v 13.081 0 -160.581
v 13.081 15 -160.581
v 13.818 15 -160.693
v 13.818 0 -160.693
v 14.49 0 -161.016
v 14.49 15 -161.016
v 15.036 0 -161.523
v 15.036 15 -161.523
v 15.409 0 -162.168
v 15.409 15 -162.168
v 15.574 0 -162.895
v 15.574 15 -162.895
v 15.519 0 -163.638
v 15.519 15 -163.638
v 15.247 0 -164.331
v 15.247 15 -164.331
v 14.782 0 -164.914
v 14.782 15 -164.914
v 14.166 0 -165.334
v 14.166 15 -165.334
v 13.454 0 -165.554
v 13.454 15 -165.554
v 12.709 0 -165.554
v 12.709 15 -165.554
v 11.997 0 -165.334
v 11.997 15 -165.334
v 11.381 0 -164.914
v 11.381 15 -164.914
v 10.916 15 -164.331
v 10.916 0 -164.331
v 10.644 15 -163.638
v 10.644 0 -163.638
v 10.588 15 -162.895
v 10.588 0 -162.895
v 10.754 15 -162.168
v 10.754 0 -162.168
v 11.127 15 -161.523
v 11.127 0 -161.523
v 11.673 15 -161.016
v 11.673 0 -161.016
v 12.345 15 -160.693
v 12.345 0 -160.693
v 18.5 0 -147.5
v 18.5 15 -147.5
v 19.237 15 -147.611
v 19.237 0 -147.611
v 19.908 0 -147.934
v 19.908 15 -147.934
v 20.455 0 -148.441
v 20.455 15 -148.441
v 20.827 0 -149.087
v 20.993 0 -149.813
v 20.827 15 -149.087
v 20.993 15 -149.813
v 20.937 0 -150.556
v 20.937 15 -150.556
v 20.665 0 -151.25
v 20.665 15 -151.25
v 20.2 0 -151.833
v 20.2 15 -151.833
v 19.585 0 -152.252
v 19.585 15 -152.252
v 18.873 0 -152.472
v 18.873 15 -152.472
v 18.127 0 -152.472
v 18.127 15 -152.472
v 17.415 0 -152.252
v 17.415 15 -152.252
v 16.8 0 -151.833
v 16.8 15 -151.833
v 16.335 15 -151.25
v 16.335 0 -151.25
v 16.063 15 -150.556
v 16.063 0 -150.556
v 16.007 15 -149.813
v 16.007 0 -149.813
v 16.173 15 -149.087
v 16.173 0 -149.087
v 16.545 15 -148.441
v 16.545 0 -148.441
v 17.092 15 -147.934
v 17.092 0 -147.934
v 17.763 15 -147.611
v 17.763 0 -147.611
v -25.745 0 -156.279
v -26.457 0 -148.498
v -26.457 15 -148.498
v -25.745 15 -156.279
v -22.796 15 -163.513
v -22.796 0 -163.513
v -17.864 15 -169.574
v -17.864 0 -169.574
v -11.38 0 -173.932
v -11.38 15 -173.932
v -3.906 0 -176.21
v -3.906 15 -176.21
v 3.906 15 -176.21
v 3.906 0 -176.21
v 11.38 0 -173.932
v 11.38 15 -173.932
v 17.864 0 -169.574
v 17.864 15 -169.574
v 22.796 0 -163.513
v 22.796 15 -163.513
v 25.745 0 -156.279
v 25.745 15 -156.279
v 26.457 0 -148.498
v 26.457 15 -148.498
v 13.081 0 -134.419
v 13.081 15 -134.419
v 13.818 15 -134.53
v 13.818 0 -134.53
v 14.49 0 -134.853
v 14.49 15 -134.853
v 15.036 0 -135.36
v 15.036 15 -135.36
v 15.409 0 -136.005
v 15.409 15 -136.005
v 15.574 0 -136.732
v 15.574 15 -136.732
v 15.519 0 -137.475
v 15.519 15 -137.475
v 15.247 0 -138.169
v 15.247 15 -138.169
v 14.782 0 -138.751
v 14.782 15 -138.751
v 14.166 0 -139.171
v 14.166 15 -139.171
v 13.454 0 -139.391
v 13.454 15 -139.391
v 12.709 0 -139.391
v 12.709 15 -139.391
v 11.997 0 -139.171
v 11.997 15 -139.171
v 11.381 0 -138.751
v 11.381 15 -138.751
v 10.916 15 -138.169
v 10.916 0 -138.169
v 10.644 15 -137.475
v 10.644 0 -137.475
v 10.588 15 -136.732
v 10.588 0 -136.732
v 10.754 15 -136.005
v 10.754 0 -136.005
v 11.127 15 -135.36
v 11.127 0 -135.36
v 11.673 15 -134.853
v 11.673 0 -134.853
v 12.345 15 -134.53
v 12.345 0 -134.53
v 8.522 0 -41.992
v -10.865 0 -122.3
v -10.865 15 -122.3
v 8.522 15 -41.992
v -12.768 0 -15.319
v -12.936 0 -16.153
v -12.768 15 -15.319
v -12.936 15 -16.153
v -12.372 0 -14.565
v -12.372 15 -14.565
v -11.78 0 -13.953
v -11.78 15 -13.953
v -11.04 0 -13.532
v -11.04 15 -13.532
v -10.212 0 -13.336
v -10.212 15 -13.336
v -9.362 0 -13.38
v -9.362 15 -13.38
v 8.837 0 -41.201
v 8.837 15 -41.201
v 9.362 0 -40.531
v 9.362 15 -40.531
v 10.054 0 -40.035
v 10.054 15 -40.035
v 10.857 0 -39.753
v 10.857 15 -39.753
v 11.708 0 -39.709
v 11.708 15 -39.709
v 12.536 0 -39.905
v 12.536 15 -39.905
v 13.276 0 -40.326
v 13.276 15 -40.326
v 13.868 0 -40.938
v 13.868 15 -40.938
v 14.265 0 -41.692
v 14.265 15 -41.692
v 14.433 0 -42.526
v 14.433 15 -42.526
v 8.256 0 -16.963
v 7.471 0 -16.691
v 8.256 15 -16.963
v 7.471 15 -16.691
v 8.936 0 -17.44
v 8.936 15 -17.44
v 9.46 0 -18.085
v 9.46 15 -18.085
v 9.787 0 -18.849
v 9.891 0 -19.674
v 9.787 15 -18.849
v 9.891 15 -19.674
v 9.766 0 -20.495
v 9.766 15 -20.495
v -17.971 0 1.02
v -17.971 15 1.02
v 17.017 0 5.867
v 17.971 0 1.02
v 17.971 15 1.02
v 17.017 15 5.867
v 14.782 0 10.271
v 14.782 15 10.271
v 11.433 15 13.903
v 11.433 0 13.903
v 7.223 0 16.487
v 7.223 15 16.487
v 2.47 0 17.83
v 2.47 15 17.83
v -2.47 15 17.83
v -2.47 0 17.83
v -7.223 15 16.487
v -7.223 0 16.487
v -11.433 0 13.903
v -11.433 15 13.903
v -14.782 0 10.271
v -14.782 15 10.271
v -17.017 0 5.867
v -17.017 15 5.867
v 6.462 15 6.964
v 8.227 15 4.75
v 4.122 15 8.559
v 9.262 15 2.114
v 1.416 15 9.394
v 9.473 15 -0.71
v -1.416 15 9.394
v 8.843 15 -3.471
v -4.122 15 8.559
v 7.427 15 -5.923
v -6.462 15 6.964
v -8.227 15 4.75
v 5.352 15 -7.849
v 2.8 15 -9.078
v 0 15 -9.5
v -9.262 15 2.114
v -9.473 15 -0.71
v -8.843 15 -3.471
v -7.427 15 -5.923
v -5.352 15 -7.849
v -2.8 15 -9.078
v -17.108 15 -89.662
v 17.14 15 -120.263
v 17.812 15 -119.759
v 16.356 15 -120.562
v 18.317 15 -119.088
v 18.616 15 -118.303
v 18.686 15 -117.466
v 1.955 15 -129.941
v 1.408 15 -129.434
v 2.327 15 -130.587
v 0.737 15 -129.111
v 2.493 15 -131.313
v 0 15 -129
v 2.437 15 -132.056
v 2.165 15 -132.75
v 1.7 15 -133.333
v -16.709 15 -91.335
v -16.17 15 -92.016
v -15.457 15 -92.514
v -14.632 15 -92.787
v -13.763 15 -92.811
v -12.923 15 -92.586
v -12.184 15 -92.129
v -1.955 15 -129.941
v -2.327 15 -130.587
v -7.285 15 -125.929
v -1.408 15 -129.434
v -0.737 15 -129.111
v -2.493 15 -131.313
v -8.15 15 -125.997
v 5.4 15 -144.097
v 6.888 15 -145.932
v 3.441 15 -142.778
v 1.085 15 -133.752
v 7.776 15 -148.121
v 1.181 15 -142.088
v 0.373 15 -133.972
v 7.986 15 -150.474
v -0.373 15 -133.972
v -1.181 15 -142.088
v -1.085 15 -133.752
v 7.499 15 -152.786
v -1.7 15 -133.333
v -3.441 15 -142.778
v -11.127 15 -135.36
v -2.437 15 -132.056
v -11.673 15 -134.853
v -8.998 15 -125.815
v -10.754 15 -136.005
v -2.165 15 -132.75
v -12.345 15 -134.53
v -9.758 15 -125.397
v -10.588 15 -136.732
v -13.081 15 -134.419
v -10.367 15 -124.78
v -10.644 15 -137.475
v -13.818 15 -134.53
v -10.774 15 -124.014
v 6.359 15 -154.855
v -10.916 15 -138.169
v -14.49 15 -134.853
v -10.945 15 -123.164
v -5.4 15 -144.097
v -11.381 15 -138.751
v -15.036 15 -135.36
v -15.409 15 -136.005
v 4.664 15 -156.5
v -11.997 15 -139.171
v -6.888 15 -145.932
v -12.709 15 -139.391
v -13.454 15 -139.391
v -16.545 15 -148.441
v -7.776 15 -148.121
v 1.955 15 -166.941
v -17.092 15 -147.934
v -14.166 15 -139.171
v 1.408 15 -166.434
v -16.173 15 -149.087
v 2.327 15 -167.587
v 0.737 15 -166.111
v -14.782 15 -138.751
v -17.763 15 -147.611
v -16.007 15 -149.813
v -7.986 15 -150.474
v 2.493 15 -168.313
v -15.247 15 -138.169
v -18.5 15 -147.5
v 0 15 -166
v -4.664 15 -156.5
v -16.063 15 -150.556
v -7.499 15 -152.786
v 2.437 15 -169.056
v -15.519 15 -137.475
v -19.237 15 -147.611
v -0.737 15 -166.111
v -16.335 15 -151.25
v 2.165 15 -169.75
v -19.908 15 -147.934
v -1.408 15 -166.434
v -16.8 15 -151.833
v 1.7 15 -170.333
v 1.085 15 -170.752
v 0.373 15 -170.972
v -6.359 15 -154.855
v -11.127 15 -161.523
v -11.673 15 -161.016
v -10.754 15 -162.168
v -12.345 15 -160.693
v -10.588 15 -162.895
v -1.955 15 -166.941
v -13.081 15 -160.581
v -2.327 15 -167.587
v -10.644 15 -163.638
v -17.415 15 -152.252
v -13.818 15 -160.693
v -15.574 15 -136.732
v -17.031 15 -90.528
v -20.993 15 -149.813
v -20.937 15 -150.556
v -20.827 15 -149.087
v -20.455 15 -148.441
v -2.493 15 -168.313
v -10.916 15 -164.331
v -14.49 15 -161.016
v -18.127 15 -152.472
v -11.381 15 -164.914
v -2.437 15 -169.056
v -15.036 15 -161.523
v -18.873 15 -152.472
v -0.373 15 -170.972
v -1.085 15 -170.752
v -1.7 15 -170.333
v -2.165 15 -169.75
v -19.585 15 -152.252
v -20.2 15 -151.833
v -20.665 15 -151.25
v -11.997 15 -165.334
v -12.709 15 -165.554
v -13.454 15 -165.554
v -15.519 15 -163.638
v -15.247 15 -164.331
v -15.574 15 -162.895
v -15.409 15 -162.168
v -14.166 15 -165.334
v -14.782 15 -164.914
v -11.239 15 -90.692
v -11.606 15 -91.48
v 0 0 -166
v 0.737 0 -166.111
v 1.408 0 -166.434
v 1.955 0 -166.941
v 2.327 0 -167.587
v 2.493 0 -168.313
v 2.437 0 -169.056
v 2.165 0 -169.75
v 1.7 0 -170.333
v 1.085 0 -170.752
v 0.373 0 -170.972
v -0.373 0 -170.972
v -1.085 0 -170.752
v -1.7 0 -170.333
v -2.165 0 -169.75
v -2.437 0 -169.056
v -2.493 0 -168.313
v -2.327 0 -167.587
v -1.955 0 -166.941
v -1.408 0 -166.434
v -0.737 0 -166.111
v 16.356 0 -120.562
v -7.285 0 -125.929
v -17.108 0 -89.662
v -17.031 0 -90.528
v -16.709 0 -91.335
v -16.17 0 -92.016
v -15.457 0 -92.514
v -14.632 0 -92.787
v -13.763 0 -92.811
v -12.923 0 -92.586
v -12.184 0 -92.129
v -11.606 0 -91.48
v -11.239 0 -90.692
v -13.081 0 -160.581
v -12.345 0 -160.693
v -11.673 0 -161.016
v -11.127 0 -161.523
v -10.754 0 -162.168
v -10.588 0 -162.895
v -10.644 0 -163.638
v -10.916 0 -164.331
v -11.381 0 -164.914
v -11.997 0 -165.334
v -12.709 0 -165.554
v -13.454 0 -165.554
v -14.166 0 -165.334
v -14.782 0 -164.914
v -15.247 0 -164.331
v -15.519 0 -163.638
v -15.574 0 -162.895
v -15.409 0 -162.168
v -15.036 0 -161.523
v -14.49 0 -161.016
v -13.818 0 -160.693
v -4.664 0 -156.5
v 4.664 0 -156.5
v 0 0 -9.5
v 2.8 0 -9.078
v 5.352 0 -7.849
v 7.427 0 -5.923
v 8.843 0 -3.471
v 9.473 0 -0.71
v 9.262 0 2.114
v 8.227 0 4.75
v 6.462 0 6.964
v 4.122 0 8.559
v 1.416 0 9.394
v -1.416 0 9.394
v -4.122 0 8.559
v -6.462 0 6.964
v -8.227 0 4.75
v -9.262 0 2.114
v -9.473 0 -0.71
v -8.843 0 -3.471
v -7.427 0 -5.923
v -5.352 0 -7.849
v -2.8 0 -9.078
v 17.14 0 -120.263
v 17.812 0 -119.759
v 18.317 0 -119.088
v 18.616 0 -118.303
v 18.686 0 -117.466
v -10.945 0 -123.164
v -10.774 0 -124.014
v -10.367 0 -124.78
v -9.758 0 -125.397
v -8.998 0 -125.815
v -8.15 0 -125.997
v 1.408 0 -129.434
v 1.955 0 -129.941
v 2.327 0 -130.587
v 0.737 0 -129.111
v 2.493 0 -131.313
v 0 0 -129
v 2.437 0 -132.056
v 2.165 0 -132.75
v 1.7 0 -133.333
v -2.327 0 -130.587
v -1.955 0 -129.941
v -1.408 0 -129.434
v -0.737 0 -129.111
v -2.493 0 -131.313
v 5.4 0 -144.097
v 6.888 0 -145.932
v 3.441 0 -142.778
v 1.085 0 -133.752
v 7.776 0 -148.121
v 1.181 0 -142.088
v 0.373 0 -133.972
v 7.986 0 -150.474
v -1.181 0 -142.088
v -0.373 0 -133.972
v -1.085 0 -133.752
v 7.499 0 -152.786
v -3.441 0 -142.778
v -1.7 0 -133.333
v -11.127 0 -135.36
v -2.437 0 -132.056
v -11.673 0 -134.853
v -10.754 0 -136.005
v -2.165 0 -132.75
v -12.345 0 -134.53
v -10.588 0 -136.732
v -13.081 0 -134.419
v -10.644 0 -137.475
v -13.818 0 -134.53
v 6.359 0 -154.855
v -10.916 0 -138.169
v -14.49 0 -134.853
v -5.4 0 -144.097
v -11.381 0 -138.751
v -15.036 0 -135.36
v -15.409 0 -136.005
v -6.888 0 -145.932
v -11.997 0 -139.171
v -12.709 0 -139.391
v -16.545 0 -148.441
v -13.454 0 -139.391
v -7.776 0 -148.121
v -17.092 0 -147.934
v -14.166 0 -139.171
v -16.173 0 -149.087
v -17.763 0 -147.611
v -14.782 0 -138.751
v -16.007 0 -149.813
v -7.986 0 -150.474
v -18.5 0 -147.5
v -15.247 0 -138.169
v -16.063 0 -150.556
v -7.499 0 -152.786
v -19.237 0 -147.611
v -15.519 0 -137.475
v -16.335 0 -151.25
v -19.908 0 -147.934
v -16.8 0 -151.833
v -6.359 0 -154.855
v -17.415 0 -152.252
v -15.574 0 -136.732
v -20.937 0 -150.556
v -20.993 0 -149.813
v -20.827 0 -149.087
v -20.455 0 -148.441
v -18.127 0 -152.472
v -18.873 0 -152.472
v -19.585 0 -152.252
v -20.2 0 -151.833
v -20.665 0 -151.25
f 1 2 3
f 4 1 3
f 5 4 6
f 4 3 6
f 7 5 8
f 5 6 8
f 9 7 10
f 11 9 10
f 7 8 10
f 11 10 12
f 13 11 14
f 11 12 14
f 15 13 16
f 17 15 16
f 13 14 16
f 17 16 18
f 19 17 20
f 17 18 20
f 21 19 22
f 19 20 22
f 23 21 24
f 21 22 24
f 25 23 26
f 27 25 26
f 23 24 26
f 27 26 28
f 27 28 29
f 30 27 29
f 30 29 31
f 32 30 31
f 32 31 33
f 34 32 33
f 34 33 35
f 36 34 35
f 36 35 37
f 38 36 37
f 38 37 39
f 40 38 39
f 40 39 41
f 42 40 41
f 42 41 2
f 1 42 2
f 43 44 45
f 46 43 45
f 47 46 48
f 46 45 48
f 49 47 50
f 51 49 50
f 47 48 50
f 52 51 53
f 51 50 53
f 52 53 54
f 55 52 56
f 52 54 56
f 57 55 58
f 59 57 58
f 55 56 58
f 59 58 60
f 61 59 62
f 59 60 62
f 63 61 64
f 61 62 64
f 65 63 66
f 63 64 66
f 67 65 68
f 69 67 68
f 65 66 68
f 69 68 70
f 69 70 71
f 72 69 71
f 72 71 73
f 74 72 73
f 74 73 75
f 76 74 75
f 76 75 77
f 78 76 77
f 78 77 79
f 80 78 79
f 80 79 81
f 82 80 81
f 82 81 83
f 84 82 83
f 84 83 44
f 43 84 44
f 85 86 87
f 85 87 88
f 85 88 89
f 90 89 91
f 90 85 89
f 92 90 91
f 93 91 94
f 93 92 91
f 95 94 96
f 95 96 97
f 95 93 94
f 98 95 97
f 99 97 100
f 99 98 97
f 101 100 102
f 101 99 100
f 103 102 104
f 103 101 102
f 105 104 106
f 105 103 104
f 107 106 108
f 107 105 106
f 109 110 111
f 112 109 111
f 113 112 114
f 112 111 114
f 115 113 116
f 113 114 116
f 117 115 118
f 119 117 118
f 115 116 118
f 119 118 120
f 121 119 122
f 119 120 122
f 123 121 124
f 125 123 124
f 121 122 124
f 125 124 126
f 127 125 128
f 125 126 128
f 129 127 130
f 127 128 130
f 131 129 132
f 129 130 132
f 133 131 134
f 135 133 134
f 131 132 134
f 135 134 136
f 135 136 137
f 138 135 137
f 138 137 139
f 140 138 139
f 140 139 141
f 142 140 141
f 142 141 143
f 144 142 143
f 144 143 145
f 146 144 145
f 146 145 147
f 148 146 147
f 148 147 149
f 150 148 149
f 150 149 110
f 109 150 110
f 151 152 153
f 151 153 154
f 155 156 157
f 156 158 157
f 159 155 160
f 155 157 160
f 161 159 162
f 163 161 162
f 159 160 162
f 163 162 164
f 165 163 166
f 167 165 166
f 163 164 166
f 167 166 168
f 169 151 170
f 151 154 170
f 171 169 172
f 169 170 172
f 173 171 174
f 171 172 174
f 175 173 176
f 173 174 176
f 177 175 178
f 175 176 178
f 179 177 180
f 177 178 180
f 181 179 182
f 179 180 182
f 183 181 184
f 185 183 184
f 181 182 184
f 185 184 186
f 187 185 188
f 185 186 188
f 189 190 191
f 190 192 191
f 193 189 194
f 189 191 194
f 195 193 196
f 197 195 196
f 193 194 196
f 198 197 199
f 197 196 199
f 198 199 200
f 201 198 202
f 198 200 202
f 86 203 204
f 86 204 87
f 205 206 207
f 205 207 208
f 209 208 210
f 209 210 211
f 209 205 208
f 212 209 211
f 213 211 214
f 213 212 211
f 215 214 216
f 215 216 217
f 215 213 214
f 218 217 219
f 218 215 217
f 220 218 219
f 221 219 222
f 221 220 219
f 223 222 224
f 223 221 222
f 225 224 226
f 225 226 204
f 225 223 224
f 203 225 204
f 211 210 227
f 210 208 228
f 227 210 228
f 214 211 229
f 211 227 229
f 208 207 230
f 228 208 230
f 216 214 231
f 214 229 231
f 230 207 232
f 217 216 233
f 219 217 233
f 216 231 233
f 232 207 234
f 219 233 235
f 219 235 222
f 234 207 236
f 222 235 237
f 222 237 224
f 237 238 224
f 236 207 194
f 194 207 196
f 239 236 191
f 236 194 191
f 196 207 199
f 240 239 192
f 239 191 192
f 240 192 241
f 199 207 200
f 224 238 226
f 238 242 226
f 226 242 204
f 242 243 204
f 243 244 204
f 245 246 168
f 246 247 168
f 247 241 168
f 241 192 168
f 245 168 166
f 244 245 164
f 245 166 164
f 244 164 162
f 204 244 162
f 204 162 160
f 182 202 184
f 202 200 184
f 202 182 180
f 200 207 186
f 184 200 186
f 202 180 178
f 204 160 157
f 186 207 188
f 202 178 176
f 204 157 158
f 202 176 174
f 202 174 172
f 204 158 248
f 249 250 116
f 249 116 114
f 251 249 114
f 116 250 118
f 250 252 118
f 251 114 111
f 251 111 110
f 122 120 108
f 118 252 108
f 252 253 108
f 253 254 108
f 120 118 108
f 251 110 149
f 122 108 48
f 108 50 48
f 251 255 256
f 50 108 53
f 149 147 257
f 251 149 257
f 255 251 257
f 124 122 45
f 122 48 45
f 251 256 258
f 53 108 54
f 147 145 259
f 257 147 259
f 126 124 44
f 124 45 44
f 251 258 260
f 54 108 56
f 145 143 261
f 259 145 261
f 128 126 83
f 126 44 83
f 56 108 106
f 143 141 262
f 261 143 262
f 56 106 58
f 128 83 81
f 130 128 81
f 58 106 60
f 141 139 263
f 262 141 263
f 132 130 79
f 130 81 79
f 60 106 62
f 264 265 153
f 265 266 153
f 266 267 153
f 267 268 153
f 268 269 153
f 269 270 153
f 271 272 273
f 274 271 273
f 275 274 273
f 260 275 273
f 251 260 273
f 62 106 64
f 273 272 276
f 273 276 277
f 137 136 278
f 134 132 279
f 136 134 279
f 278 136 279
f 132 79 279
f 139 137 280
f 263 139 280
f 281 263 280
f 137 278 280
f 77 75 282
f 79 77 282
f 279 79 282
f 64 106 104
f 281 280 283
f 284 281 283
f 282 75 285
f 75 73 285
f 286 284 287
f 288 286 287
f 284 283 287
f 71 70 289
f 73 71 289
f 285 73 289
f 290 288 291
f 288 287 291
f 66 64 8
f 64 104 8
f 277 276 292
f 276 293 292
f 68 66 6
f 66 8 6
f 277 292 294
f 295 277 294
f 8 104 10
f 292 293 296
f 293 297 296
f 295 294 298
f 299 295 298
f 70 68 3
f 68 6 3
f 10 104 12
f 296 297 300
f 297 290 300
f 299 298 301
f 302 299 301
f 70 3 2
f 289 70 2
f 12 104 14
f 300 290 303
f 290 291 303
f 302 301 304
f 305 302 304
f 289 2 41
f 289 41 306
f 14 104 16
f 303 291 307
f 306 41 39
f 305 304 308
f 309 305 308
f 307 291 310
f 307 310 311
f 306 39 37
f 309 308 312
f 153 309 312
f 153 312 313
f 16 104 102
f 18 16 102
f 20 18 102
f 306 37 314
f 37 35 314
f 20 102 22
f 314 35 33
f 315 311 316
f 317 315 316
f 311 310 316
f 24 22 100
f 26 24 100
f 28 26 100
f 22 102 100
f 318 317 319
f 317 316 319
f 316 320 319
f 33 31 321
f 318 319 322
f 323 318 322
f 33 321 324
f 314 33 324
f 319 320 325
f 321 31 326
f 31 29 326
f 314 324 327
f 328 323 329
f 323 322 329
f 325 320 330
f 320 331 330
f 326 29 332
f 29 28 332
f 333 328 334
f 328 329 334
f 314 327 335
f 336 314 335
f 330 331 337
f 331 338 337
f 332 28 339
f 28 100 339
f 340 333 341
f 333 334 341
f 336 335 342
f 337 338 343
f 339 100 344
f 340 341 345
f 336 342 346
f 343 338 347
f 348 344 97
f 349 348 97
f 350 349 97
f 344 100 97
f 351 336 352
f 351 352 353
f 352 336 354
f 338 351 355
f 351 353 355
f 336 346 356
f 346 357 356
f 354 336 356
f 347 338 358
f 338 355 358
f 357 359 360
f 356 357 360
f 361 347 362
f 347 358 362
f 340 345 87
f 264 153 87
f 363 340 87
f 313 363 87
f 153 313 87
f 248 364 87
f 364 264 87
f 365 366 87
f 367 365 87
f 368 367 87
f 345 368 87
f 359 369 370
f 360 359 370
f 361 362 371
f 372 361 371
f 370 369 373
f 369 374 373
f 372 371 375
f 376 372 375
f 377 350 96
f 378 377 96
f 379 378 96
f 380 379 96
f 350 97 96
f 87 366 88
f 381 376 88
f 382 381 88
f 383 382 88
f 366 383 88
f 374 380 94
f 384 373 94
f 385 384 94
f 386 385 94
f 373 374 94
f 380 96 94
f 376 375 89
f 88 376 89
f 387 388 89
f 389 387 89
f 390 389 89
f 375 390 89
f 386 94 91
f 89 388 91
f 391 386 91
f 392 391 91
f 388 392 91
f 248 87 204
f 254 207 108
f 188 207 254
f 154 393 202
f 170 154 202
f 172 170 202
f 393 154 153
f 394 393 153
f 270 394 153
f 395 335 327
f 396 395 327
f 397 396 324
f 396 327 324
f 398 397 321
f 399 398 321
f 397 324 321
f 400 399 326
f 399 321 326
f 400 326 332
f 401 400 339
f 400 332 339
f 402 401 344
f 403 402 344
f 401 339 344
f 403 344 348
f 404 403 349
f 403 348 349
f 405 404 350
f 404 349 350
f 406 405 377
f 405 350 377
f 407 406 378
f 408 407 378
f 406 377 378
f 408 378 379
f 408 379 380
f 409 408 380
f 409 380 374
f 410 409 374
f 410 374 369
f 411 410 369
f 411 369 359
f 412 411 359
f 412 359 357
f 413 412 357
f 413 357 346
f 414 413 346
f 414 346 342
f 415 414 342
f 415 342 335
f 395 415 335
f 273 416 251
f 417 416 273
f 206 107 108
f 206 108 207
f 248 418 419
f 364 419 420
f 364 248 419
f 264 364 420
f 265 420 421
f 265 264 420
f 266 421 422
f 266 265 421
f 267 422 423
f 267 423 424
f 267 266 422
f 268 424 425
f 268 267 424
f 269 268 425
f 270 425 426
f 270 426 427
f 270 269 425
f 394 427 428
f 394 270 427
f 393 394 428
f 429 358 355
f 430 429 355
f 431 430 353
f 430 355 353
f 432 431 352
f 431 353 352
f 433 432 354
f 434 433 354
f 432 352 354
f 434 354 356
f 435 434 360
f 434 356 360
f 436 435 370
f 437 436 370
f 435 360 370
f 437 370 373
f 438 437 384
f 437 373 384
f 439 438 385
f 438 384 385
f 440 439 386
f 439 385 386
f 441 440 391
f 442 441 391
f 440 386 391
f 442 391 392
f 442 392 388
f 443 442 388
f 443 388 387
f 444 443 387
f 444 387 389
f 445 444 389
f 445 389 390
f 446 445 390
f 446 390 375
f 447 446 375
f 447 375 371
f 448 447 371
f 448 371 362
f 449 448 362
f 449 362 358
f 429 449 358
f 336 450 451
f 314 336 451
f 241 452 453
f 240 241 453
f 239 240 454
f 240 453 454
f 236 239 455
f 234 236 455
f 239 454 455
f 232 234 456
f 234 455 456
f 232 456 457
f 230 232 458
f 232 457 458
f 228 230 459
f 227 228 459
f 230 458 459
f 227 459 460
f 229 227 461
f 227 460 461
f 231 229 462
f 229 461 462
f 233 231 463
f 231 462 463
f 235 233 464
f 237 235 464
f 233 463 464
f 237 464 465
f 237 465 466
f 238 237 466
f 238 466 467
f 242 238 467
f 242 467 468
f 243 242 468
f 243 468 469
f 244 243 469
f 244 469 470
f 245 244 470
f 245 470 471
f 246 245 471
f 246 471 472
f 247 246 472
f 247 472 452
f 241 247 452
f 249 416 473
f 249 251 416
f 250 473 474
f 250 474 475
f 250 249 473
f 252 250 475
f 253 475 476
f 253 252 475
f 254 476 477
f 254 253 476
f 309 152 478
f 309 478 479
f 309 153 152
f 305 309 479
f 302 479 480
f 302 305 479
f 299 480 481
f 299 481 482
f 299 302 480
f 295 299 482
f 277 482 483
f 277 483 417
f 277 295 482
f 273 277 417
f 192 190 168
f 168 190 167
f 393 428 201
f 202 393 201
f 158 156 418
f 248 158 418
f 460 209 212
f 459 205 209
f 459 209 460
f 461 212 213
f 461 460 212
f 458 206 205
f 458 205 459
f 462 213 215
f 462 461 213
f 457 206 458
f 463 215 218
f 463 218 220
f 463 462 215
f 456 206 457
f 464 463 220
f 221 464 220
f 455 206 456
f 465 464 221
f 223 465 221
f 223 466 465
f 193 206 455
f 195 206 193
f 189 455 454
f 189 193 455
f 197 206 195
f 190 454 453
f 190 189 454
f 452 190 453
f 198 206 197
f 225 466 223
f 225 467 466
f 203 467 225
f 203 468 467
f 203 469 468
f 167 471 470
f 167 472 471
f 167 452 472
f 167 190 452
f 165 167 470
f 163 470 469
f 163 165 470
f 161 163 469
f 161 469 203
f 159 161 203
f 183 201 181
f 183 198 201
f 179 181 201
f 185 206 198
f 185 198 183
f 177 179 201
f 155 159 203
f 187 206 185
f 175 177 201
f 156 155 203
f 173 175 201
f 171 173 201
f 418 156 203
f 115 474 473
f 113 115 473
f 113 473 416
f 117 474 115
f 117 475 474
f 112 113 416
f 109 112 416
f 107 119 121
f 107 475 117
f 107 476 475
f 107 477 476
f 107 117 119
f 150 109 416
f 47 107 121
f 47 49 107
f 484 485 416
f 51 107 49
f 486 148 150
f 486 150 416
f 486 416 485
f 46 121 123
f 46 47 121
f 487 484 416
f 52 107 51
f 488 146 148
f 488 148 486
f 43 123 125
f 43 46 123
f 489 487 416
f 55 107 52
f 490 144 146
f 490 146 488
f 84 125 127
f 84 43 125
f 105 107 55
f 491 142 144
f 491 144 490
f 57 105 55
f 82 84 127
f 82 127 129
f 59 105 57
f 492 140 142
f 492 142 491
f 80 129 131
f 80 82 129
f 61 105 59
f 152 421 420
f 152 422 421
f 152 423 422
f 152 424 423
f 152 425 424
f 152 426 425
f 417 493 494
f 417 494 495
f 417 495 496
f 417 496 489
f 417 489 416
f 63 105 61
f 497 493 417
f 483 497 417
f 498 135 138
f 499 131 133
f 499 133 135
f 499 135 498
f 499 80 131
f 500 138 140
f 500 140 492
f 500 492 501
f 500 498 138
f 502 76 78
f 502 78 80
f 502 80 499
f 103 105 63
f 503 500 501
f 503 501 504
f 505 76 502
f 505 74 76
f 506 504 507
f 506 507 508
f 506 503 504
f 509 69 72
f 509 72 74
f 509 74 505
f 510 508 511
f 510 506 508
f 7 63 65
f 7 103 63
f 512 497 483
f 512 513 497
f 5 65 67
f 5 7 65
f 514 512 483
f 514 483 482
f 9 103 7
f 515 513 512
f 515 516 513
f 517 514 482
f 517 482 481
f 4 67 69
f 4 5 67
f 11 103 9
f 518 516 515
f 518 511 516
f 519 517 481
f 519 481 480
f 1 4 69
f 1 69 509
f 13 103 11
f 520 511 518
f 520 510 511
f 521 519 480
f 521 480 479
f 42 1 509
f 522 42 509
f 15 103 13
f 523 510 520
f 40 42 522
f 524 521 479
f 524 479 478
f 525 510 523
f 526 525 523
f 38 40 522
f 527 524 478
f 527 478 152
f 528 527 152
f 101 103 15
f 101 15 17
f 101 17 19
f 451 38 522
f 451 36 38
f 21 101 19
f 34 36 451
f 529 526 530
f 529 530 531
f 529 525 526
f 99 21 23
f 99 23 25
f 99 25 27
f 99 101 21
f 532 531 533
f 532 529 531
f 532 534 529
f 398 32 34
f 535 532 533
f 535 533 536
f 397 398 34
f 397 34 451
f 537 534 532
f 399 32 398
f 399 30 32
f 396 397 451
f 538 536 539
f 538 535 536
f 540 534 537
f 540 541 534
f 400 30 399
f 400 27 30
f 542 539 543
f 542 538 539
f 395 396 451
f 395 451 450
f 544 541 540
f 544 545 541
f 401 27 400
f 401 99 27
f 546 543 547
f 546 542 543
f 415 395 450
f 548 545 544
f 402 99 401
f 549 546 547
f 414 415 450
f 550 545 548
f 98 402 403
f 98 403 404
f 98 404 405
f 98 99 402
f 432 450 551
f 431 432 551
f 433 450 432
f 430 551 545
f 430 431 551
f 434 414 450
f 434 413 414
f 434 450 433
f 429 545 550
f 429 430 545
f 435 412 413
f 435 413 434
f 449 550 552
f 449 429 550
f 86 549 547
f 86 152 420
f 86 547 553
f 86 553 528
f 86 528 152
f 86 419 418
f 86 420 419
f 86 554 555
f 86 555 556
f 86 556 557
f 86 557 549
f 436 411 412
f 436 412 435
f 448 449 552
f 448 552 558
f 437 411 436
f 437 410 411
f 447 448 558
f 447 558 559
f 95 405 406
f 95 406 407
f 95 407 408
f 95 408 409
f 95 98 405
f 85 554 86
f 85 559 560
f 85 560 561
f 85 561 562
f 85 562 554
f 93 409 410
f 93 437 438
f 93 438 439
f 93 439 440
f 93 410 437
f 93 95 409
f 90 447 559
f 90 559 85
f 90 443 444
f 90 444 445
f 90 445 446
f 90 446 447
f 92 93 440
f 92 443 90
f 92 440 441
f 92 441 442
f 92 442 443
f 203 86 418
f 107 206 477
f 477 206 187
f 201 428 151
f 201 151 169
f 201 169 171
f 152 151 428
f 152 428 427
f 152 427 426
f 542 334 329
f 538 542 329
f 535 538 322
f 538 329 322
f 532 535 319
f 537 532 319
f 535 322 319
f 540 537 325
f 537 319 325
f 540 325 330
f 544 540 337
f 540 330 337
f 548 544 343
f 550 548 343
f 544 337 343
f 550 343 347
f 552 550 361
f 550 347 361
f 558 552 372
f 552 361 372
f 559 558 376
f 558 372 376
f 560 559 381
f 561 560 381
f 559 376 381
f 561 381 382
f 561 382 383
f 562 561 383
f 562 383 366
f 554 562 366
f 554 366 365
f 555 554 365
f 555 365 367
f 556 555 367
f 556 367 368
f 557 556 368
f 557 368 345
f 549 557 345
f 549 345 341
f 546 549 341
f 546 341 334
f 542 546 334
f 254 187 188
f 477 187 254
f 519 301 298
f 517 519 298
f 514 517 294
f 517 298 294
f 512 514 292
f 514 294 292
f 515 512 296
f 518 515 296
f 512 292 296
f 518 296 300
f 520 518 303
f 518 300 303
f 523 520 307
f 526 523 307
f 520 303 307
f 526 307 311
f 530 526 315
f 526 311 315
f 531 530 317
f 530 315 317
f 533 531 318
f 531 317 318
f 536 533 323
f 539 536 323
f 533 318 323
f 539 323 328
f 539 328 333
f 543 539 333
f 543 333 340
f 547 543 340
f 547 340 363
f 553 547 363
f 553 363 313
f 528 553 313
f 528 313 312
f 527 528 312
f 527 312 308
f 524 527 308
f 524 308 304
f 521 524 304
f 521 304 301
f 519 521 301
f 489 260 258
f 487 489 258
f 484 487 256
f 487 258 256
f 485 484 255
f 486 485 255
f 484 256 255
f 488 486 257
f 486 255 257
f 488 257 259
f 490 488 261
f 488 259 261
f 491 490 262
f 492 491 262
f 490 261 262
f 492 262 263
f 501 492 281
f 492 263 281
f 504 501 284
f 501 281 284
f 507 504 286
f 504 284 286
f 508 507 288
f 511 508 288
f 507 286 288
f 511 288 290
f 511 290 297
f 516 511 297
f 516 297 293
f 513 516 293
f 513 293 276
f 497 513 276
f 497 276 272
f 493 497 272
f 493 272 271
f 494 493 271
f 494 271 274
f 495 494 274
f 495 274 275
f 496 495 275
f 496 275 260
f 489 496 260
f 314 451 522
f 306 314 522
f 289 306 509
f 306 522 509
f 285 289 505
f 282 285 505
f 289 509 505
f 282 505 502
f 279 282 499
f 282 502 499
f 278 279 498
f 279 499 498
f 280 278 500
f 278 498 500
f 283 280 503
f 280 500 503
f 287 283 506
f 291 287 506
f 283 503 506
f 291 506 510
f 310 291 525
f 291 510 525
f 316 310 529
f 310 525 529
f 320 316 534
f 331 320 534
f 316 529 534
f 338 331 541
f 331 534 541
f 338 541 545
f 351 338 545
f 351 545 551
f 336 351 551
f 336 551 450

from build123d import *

# Parameters (mm, degrees)
SKETCH_1_R          = 5
EXTRUDE_1_DEPTH     = 15
FILLET_1_R          = 3
SKETCH_2_R          = 2.5
CUT_EXTRUDE_1_DEPTH = 180.107509614
SKETCH_4_R          = 9.5
CUT_EXTRUDE_3_DEPTH = 20


with BuildPart() as part:
    # 草图1 → 凸台-拉伸1 (new body)
    with BuildSketch(Plane(origin=(0, 0, 0), x_dir=(1, 0, 0), z_dir=(0, 1, 0))):
        with BuildLine():
            Line((-17.971076762, -1.02), (-26.457418567, 148.498333333))
            ThreePointArc((-26.457418567, 148.498333333), (0, 176.5), (26.457418567, 148.498333333))
            Line((26.457418567, 148.498333333), (17.971076762, -1.02))
            ThreePointArc((17.971076762, -1.02), (0, -18), (-17.971076762, -1.02))
        make_face()
        with Locations(Location((0, 0, 0), (0, 0, 270))):
            Circle(SKETCH_1_R, mode=Mode.SUBTRACT)
        Polygon((-12.740980954, 12.714849757), (-18.554385191, 115.139490738), (10.712851955, 17.329399023), align=None, mode=Mode.SUBTRACT)
        Polygon((13.283215706, 22.268322657), (18.830257334, 120), (-12, 127), align=None, mode=Mode.SUBTRACT)
        with BuildLine():
            Line((0, 156.5), (4.663689527, 156.5))
            ThreePointArc((4.663689527, 156.5), (0, 142), (-4.663689527, 156.5))
            Line((-4.663689527, 156.5), (0, 156.5))
        make_face(mode=Mode.SUBTRACT)
    extrude(amount=EXTRUDE_1_DEPTH)

    # 圆角1
    fillet_1_edges = [part.edges().sort_by_distance(p)[0] for p in [
        (-12.740980954, 7.5, -12.714849757),
        (10.712851955, 7.5, -17.329399023),
        (-18.554385191, 7.5, -115.139490738),
        (18.830257334, 7.5, -120),
        (-12, 7.5, -127),
        (13.283215706, 7.5, -22.268322657),
    ]]
    fillet(fillet_1_edges, radius=FILLET_1_R)

    # 草图2 → 切除-拉伸1 (cut, through all)
    with BuildSketch(Plane(origin=(0, 15, 0), x_dir=(1, 0, 0), z_dir=(0, 1, 0))):
        with Locations(Location((0, 168.5, 0), (0, 0, 270))):
            Circle(SKETCH_2_R)
        with Locations(Location((13.081475452, 163.081475452, 0), (0, 0, 270))):
            Circle(SKETCH_2_R)
        with Locations(Location((18.5, 150, 0), (0, 0, 270))):
            Circle(SKETCH_2_R)
        with Locations(Location((13.081475452, 136.918524548, 0), (0, 0, 270))):
            Circle(SKETCH_2_R)
        with Locations(Location((0, 131.5, 0), (0, 0, 270))):
            Circle(SKETCH_2_R)
        with Locations(Location((-13.081475452, 136.918524548, 0), (0, 0, 270))):
            Circle(SKETCH_2_R)
        with Locations(Location((-18.5, 150, 0), (0, 0, 270))):
            Circle(SKETCH_2_R)
        with Locations(Location((-13.081475452, 163.081475452, 0), (0, 0, 270))):
            Circle(SKETCH_2_R)
    extrude(amount=-CUT_EXTRUDE_1_DEPTH, mode=Mode.SUBTRACT)

    # 草图4 → 切除-拉伸3 (cut)
    with BuildSketch(Plane.XZ):
        with Locations(Location((0, 0, 0), (0, 0, 270))):
            Circle(SKETCH_4_R)
    extrude(amount=-CUT_EXTRUDE_3_DEPTH, mode=Mode.SUBTRACT)


solid = part.part
